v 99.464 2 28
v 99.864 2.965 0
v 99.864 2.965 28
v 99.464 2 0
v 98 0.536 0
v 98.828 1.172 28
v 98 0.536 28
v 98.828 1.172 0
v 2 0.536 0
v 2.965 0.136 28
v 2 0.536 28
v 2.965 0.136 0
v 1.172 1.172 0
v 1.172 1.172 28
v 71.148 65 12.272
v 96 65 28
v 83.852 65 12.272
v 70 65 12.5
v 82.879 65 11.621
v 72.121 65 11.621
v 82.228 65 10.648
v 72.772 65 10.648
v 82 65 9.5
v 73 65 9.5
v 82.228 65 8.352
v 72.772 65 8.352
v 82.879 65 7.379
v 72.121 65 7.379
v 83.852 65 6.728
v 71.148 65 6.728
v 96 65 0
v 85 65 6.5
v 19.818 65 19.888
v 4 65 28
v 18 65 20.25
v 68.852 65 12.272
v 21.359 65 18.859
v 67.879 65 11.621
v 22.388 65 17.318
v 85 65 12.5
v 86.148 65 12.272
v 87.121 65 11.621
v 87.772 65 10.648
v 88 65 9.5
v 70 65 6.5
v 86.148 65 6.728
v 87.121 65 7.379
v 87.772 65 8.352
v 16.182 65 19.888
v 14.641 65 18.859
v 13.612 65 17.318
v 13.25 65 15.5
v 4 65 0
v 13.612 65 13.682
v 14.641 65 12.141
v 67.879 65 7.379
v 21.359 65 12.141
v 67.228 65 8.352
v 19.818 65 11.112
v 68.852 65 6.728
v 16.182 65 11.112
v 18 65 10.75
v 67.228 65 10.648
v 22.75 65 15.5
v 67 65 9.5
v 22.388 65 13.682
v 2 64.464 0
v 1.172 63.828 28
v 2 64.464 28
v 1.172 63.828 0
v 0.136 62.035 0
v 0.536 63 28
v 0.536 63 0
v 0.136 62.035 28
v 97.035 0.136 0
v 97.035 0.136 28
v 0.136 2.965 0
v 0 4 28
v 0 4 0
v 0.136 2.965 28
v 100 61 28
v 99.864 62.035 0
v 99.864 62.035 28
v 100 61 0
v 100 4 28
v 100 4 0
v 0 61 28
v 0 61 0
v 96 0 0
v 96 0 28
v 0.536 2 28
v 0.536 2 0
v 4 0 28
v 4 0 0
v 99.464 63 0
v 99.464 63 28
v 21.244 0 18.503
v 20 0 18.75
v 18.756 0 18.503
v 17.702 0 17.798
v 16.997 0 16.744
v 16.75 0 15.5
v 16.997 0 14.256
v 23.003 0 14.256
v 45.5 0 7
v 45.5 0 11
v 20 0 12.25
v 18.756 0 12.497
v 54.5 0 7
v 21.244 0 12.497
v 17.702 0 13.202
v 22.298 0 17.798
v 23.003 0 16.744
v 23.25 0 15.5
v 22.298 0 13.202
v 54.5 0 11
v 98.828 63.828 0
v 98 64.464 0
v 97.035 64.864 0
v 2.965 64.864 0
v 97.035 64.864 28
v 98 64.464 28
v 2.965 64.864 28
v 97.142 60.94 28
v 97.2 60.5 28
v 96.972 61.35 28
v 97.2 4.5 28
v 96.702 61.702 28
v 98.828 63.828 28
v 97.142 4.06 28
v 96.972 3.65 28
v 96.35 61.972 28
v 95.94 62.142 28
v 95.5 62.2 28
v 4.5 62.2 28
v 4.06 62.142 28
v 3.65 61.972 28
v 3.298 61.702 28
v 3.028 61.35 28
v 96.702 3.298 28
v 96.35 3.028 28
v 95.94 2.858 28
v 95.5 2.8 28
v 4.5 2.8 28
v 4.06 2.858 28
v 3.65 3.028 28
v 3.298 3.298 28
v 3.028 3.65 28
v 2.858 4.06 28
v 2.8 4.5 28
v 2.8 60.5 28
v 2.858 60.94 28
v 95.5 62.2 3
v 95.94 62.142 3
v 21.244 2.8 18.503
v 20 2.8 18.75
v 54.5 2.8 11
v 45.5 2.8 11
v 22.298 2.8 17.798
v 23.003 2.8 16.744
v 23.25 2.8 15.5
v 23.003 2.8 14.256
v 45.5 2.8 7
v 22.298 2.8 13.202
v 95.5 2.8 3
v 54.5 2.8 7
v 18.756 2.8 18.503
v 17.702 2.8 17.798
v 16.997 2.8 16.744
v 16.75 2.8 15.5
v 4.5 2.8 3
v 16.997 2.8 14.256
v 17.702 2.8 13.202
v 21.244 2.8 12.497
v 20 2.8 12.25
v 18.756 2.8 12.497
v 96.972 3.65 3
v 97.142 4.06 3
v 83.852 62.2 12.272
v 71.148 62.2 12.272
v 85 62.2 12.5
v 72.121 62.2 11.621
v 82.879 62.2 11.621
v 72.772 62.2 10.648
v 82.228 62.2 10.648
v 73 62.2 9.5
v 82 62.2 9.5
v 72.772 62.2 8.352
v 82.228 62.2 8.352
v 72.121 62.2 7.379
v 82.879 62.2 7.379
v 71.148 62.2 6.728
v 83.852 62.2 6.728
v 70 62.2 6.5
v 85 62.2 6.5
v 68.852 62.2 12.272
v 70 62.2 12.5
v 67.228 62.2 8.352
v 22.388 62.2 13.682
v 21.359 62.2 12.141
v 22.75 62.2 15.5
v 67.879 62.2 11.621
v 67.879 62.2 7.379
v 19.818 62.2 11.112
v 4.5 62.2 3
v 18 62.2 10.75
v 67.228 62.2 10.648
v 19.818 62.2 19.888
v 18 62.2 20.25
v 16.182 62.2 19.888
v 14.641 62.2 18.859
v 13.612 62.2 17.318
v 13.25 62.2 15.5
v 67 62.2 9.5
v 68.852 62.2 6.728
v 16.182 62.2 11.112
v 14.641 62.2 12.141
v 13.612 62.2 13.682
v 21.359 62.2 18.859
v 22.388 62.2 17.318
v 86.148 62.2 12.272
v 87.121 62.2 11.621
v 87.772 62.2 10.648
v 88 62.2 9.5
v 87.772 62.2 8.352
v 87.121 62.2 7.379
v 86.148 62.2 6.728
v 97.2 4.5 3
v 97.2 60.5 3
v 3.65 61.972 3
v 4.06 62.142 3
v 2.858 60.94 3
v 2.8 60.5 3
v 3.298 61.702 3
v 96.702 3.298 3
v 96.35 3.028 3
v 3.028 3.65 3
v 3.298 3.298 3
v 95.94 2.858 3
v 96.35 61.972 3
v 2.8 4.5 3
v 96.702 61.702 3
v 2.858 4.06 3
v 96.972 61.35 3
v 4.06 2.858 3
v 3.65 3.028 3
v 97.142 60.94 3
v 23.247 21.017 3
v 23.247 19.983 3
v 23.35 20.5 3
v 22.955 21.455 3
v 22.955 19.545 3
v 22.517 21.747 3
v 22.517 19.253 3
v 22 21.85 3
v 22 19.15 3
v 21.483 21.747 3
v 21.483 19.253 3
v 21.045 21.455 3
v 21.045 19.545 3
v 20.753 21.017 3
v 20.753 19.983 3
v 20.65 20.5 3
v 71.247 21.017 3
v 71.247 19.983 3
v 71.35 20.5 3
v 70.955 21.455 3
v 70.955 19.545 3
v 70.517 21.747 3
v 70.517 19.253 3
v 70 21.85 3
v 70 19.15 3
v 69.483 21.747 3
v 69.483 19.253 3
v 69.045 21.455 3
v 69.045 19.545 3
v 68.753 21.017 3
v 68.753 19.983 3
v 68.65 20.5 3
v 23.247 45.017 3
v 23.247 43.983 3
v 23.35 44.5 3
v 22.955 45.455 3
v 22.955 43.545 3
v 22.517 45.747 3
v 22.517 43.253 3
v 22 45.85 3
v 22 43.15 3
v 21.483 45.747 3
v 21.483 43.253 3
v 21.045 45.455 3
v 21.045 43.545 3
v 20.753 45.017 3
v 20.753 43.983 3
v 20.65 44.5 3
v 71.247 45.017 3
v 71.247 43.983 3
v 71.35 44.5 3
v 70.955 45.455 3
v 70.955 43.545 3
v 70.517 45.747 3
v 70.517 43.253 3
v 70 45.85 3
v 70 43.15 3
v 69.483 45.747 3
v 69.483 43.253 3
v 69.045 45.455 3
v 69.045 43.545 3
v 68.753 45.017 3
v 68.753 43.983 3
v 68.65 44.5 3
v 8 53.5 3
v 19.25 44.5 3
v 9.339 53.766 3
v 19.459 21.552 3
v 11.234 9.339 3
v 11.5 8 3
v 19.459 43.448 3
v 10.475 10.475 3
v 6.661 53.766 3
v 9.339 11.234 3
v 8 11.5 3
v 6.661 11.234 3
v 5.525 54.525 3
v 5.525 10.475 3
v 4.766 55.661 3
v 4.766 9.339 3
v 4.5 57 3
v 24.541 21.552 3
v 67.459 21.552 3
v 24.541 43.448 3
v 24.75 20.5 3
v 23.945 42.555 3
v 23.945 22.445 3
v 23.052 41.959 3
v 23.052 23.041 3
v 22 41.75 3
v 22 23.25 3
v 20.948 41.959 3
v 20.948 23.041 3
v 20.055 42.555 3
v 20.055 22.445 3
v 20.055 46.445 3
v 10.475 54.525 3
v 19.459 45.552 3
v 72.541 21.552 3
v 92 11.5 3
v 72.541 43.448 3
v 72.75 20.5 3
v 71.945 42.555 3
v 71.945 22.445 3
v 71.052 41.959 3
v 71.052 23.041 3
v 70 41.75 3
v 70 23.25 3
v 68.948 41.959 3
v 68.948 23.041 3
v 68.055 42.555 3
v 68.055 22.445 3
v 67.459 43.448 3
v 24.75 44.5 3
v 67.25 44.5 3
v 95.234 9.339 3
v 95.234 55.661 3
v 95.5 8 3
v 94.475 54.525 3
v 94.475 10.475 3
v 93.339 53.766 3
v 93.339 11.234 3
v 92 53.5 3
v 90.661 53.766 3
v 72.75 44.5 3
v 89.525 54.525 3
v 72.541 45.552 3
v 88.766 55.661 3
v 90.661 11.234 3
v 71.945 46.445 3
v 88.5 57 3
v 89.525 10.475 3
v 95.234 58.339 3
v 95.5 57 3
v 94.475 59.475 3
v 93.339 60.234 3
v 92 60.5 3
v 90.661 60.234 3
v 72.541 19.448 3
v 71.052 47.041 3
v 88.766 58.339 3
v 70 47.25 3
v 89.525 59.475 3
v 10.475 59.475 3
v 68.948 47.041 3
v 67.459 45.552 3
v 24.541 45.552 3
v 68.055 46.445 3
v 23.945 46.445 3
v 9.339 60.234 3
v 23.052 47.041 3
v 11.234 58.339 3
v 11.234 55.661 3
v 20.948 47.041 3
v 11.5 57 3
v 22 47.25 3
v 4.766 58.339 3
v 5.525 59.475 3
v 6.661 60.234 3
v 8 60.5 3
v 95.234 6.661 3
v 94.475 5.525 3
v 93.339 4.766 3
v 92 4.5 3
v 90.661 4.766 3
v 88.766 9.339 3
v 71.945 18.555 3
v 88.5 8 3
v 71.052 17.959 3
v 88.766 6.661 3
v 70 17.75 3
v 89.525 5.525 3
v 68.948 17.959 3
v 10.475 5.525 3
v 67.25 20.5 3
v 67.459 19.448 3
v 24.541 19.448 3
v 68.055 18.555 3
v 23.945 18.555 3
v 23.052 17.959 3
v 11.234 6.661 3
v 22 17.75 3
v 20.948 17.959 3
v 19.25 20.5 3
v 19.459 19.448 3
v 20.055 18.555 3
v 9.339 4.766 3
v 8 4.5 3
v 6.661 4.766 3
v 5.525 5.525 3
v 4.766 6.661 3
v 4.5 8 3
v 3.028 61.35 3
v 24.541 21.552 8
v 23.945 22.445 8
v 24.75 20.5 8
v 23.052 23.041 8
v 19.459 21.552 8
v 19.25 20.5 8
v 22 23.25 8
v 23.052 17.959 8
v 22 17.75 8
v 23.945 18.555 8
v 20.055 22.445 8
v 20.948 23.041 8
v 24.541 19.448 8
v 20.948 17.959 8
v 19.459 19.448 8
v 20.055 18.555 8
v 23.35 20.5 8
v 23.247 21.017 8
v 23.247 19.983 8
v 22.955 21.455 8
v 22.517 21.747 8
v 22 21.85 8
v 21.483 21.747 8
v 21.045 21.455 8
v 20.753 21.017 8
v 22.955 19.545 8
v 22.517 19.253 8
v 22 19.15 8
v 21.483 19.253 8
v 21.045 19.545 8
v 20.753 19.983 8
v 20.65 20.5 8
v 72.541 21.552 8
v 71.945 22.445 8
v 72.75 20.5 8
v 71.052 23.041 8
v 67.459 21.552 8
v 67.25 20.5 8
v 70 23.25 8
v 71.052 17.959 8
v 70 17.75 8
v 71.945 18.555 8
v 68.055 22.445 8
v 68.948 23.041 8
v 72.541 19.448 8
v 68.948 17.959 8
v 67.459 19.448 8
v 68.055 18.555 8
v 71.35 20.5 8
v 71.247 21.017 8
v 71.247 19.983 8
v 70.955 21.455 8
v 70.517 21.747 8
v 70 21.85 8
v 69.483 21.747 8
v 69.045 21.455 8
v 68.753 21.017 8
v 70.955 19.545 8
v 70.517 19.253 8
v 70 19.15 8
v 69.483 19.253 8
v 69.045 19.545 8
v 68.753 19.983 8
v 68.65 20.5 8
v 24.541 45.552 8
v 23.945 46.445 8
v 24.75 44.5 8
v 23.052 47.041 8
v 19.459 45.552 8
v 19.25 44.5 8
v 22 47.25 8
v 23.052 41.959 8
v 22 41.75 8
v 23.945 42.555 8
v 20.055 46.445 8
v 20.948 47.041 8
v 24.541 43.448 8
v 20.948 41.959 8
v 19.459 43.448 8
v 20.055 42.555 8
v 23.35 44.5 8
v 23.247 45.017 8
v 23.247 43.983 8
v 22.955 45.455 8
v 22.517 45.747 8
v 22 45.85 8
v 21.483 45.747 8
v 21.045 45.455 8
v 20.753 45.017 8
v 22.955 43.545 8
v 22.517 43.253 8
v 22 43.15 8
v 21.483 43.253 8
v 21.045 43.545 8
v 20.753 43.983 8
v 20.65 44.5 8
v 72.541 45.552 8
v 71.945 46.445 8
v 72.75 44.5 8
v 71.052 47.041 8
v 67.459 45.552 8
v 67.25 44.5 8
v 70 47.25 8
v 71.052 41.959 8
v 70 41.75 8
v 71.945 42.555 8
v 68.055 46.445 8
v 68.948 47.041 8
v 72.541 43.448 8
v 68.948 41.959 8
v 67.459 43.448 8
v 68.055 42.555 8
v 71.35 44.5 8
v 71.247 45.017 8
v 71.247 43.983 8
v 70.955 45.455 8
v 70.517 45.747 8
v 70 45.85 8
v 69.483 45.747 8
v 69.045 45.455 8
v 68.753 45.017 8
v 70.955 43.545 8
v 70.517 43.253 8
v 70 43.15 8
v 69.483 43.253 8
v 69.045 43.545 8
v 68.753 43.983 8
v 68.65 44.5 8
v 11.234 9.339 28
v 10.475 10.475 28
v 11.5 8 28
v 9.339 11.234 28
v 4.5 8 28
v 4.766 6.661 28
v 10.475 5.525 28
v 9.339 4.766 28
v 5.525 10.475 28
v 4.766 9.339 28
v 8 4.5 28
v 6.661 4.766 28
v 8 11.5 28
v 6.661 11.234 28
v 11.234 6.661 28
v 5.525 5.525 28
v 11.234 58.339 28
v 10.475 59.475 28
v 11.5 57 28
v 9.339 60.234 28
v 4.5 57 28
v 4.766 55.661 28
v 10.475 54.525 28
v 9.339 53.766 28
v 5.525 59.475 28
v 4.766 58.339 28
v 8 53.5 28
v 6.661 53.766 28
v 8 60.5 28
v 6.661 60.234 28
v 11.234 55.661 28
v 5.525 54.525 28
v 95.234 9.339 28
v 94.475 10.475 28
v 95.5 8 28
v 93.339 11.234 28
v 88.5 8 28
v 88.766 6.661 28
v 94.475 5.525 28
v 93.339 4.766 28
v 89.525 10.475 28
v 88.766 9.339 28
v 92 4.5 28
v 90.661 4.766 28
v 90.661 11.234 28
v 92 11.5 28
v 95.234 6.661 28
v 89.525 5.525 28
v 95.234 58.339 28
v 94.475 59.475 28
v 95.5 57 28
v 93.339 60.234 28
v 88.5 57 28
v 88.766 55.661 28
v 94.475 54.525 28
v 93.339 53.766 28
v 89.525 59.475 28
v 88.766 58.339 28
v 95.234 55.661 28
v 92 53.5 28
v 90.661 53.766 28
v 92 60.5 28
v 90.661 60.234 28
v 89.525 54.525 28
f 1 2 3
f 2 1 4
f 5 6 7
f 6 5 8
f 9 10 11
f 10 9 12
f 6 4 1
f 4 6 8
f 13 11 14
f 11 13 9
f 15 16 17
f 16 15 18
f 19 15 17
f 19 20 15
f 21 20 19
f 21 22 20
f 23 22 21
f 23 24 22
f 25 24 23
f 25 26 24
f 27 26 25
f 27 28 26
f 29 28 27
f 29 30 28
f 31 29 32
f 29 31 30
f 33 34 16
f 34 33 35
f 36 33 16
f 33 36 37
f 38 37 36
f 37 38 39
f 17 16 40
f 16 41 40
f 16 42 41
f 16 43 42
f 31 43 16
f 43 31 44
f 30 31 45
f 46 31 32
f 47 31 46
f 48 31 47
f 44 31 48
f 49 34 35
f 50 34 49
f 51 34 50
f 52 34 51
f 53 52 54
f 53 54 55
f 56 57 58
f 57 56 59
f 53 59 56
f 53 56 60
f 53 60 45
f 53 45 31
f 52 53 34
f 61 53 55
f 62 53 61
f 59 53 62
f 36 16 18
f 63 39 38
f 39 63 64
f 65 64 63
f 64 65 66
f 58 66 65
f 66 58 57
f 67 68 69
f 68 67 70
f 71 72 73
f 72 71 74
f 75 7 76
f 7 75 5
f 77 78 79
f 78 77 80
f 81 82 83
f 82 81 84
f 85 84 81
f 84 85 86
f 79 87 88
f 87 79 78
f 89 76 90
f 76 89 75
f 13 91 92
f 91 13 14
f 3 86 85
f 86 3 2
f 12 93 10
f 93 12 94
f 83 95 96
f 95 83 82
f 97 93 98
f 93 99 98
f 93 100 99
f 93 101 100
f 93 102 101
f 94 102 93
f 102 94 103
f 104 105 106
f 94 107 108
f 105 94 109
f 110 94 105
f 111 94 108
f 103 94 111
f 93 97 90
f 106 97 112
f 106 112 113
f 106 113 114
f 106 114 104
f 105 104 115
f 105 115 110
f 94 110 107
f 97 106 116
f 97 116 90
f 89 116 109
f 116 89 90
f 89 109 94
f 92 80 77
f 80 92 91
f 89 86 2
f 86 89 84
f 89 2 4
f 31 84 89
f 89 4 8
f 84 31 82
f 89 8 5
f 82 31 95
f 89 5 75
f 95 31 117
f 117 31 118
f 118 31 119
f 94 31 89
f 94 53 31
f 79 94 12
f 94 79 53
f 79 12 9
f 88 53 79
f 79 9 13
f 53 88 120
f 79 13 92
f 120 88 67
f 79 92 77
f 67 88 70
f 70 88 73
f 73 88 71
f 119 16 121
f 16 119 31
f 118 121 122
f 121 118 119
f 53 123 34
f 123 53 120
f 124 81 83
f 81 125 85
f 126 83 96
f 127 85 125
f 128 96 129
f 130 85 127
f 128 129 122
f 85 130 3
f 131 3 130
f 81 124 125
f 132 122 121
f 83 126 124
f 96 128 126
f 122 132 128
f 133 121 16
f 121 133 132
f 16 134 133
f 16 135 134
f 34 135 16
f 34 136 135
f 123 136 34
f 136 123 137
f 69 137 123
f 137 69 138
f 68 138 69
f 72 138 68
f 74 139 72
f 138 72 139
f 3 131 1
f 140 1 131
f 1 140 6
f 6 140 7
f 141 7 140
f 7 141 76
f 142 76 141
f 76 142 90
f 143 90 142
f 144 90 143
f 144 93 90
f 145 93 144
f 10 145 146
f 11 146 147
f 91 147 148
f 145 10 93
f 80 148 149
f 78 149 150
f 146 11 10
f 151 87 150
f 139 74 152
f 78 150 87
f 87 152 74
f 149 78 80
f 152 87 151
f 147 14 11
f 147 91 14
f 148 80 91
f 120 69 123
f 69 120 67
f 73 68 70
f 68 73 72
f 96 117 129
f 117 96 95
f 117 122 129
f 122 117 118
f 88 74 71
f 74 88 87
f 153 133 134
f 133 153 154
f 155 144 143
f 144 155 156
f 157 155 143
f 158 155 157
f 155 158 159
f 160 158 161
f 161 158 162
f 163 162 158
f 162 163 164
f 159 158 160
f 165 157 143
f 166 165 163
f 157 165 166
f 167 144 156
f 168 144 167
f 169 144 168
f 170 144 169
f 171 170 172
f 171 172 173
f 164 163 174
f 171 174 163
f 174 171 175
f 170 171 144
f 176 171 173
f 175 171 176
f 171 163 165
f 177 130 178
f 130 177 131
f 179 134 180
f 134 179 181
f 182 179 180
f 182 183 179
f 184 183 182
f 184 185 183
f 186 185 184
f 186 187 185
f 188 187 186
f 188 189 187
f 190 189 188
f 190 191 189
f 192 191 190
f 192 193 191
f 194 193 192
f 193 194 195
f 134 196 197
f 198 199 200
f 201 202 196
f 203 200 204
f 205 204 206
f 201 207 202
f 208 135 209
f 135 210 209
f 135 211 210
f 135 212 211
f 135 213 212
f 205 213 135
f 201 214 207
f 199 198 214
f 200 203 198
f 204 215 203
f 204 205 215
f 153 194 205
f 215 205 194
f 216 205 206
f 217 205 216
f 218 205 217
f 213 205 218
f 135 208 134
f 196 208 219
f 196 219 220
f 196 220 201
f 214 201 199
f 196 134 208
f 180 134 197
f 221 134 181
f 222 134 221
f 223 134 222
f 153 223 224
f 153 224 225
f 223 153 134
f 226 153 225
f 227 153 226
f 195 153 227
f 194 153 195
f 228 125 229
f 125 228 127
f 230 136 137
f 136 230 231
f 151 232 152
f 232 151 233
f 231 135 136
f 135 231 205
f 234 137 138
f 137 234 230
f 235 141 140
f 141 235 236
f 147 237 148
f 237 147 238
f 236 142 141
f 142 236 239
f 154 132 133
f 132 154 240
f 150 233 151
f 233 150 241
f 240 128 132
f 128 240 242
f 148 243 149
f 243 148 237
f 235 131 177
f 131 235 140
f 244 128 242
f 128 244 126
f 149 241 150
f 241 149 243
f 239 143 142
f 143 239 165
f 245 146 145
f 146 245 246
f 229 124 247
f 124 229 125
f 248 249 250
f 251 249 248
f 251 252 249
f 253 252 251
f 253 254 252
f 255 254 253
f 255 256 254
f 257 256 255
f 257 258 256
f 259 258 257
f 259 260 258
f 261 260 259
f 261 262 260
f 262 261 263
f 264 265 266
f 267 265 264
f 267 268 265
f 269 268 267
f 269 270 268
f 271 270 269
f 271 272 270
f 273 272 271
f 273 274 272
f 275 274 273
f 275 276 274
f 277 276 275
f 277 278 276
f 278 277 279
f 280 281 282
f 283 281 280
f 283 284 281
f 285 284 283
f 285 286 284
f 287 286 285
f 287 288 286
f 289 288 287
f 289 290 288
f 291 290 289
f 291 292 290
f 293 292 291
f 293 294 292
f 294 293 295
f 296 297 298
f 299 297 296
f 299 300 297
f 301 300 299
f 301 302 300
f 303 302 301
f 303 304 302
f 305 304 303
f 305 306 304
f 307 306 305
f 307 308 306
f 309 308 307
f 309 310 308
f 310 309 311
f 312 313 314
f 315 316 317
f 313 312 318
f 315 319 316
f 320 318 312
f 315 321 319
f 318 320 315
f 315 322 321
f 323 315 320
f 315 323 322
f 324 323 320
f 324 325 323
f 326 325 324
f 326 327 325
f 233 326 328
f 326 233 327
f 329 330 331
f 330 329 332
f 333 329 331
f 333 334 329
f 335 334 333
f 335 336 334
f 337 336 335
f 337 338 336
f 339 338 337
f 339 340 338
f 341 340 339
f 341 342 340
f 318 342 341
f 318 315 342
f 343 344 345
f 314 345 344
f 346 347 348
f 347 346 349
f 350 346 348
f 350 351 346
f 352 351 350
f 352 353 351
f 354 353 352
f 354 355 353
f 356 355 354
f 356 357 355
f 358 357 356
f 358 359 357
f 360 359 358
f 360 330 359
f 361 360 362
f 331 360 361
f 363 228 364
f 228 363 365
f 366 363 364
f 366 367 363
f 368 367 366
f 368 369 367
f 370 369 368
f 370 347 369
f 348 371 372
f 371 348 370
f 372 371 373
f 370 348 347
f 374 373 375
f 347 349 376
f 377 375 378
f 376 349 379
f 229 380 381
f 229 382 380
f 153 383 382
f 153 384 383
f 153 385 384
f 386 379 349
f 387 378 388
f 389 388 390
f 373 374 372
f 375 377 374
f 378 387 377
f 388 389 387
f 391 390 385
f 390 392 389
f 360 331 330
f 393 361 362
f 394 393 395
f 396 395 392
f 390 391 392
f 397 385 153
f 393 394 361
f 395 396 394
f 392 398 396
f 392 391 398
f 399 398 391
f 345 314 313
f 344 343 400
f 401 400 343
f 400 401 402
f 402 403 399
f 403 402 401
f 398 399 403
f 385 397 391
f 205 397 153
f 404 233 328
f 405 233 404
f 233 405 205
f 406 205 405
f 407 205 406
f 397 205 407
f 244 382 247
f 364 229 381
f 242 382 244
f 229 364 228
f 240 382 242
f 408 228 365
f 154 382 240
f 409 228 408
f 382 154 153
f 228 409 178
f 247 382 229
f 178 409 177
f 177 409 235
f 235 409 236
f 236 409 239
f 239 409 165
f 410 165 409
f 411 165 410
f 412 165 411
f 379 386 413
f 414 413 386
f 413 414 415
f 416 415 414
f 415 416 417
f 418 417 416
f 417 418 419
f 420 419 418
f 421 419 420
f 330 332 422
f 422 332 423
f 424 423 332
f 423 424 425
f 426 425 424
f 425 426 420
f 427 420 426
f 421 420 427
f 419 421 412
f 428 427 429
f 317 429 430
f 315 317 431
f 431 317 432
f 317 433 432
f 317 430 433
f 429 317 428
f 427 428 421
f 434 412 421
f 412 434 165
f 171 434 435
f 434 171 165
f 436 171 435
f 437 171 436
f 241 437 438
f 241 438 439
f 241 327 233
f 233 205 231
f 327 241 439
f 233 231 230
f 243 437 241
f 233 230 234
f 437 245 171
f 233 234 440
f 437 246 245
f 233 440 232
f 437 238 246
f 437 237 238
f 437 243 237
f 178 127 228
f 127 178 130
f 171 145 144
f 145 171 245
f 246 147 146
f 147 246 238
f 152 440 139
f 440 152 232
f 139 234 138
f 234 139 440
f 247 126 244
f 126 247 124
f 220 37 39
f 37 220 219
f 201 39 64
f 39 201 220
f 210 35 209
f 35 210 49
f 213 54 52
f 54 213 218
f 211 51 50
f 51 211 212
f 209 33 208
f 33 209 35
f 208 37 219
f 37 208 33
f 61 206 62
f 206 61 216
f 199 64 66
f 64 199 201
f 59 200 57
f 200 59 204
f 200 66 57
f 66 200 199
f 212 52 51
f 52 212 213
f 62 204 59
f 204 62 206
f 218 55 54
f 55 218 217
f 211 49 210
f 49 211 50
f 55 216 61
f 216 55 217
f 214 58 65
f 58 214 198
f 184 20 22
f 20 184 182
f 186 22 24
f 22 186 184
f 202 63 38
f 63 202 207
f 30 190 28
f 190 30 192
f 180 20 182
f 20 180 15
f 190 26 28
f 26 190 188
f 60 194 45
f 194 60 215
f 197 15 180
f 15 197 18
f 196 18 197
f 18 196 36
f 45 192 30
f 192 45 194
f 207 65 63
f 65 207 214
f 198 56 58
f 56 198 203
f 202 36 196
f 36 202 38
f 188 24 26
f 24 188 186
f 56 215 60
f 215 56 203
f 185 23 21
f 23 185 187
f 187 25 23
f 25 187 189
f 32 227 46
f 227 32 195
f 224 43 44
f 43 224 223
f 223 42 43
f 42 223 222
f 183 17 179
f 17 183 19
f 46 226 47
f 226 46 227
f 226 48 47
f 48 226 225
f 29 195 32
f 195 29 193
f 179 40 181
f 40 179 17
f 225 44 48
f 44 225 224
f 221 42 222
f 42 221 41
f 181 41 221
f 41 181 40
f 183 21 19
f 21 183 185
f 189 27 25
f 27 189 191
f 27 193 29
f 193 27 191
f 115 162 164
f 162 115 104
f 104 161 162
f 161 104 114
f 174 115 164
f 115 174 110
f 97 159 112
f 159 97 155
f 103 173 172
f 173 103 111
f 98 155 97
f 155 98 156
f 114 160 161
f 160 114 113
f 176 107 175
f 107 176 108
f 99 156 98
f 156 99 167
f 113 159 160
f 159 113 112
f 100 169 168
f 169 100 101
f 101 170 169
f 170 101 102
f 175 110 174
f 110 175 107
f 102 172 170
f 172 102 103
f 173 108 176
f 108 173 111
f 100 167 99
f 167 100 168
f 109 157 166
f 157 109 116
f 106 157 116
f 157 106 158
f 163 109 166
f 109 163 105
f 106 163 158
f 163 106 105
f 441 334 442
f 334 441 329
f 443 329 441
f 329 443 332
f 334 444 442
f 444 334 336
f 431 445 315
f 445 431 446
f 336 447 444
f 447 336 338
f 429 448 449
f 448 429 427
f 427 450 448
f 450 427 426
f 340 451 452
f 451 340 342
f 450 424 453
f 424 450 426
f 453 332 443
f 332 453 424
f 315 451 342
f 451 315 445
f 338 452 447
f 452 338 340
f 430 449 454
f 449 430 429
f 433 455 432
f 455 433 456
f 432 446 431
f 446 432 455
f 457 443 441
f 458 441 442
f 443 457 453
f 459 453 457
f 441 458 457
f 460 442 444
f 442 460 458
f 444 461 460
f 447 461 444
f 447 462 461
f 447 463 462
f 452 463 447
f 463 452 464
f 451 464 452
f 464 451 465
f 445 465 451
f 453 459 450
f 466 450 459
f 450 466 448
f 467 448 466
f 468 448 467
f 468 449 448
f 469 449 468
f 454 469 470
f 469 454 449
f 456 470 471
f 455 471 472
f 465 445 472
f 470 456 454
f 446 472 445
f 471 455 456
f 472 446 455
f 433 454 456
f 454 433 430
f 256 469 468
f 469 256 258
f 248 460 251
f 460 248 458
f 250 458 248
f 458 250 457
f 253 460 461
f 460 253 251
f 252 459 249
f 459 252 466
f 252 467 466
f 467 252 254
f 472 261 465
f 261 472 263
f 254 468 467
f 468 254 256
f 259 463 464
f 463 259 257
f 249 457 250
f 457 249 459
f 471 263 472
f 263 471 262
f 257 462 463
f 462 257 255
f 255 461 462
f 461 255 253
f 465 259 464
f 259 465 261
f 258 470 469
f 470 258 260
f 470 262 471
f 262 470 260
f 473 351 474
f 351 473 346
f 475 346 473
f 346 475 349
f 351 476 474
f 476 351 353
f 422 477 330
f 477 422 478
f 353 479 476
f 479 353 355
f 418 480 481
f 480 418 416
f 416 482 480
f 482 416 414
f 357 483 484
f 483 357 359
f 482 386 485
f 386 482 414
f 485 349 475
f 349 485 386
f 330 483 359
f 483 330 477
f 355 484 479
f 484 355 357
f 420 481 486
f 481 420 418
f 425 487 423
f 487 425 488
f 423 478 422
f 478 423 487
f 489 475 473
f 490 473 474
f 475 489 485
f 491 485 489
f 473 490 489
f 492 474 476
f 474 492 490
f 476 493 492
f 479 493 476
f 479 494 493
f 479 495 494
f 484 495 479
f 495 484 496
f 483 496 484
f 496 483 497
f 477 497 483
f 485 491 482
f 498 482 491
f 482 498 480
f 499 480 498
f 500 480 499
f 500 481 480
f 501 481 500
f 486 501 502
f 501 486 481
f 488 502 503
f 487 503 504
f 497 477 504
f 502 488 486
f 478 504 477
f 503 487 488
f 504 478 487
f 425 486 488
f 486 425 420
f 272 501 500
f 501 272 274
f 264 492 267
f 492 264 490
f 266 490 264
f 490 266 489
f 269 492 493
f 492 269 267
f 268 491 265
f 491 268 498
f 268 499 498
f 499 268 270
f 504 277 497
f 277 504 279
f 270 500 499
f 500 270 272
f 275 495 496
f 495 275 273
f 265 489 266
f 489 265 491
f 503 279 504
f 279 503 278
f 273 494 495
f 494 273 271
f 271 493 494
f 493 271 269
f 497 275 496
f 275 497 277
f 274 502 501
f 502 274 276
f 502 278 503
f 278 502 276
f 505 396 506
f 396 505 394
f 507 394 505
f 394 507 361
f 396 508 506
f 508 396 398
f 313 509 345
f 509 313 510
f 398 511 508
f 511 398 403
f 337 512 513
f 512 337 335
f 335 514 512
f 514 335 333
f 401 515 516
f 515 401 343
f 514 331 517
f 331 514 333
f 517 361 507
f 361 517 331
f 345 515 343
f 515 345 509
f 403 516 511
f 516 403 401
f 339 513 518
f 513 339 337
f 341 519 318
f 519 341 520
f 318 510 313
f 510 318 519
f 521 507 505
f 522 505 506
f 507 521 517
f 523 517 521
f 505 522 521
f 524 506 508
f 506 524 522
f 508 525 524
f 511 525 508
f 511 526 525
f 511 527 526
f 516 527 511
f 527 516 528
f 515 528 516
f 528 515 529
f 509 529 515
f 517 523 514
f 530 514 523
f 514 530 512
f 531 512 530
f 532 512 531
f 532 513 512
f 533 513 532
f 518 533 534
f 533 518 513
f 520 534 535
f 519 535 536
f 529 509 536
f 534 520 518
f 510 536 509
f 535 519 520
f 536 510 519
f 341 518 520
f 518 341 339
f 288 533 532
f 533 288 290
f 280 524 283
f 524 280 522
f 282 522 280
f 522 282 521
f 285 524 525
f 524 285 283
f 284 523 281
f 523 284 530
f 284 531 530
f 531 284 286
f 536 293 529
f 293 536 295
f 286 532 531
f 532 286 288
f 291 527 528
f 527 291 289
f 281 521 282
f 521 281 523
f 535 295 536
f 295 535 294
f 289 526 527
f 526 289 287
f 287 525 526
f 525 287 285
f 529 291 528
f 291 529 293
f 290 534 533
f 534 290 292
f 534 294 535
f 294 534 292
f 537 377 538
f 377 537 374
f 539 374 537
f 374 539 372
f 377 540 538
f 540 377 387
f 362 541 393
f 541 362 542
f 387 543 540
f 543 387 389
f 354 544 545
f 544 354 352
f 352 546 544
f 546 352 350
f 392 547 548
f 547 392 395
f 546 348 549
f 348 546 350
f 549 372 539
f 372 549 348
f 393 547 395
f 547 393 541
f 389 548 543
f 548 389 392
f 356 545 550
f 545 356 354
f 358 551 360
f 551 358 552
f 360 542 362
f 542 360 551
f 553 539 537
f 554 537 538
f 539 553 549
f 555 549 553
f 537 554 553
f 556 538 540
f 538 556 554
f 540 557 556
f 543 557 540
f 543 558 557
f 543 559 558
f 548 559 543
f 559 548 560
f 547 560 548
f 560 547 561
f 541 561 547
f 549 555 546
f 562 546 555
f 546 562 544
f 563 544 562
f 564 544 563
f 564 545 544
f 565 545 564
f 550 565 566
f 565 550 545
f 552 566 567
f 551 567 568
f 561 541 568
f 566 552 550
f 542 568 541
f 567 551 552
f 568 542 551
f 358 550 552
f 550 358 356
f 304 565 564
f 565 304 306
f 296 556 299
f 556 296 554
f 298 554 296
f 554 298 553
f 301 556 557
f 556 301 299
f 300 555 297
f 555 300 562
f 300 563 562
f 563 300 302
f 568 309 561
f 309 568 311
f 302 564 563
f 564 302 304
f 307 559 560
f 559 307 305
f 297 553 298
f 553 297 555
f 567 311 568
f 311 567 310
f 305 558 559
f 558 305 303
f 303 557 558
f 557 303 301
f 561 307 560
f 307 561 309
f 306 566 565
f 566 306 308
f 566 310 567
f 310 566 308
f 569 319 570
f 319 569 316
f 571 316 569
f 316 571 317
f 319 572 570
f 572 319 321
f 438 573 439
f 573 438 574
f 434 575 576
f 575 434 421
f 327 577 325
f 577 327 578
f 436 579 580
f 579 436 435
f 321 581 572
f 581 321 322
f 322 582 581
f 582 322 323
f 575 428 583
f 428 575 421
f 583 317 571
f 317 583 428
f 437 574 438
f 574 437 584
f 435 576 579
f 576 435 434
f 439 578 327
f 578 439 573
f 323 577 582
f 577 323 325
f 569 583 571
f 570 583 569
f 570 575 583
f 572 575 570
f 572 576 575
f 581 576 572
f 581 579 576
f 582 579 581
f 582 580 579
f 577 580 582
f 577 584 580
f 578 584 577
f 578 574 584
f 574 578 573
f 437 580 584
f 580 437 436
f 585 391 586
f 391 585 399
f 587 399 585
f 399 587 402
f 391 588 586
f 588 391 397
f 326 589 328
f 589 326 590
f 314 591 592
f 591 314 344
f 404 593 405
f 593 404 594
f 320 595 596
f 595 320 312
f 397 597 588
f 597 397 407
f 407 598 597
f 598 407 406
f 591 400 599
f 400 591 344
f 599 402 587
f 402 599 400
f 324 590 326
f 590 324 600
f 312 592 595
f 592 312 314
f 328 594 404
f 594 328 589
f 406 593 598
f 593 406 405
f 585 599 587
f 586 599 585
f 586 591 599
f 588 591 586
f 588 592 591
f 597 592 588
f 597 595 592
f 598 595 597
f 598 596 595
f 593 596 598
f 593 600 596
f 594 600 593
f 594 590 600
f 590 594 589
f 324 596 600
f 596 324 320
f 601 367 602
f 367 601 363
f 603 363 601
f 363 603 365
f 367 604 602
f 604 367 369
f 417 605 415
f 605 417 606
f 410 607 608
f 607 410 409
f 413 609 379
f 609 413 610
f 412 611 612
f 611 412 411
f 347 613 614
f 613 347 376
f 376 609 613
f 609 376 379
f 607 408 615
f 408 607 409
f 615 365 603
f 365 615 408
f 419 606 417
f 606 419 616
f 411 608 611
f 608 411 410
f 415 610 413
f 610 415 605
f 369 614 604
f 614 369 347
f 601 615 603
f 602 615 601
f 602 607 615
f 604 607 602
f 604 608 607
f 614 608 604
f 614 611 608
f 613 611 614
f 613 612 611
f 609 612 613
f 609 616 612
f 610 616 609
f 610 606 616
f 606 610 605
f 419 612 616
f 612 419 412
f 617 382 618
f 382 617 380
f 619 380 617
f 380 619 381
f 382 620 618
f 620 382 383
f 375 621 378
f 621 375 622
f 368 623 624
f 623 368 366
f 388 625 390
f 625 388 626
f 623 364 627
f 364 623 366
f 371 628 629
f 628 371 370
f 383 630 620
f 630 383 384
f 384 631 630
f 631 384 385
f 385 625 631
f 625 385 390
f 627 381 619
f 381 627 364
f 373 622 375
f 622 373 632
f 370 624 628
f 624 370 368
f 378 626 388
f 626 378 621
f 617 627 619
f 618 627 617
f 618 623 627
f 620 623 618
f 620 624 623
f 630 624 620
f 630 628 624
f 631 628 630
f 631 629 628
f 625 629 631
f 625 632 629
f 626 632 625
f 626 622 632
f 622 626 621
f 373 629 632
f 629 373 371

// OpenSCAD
/**
 * freq_counter_box.scad — TM-CAL-ENC-004 Rev A
 * Standalone Frequency Counter Enclosure
 *
 * Standalone counter for field use when full cal station isn't needed.
 * Accepts GPSDO 1PPS reference via SMA (rear), or runs free-running
 * (lower accuracy) if GPS not connected.
 *
 * Contents:
 *   - ESP32-WROOM-32 devboard
 *   - 74ACT14 Schmitt trigger + 74HC390 prescaler PCB
 *   - SSD1306 OLED 128×64 (front panel)
 *
 * Front panel: BNC FREQ IN, OLED display, range switch, gate switch
 * Rear panel:  SMA 1PPS IN (GPS gate), USB power, SMA HOLD (future)
 *
 * Envelope: 100×65×38 mm
 */

// ── Parameters ──────────────────────────────────────────────────────────────
box_w  = 100.0;
box_d  = 65.0;
box_h  = 38.0;
wall   = 2.8;
floor_h = 3.0;
lid_h  = 10.0;
body_h = box_h - lid_h;
r      = 4.0;
$fn    = 32;

// Component cutouts
bnc_d      = 9.5;
sma_d      = 6.5;
oled_w     = 28.0;   // SSD1306 0.96" OLED active area
oled_h     = 14.0;
usb_w      = 9.0;
usb_h      = 4.0;
sw_d       = 6.0;    // toggle switch shaft hole
screw_d    = 3.3;

// OLED position: centered horizontally, upper third of front panel
oled_x     = (box_w - oled_w) / 2;
oled_z     = floor_h + 10;

module rounded_box(w, d, h, r_) {
    hull()
        for (x=[r_, w-r_]) for (y=[r_, d-r_])
            translate([x, y, 0]) cylinder(h=h, r=r_, $fn=24);
}

module standoff(x, y) {
    translate([x, y, floor_h])
        difference() {
            cylinder(h=5, d=5.5, $fn=16);
            translate([0,0,-0.5]) cylinder(h=6, d=2.7, $fn=16);
        }
}

module body() {
    difference() {
        rounded_box(box_w, box_d, body_h, r);

        // Inner cavity
        translate([wall, wall, floor_h])
            rounded_box(box_w-2*wall, box_d-2*wall, body_h, r-wall+0.5);

        // ── FRONT PANEL (y=box_d) ──────────────────────────────────────
        // BNC FREQ IN (left side of front panel)
        translate([18, box_d+0.5, floor_h + (body_h-floor_h)/2])
        rotate([90,0,0]) cylinder(h=wall+1, d=bnc_d, $fn=16);

        // OLED window (center/right)
        translate([oled_x, box_d+0.5, oled_z])
            cube([oled_w, wall+1, oled_h]);

        // Range toggle switch (÷1/÷10)
        translate([70, box_d+0.5, floor_h + (body_h-floor_h)/2 - 6])
        rotate([90,0,0]) cylinder(h=wall+1, d=sw_d, $fn=16);

        // Gate toggle switch (1s/10s)
        translate([85, box_d+0.5, floor_h + (body_h-floor_h)/2 - 6])
        rotate([90,0,0]) cylinder(h=wall+1, d=sw_d, $fn=16);

        // ── REAR PANEL (y=0) ──────────────────────────────────────────
        // SMA: 1PPS IN from GPSDO
        translate([20, -0.5, floor_h + (body_h-floor_h)/2])
        rotate([-90,0,0]) cylinder(h=wall+1, d=sma_d, $fn=16);

        // USB Micro-B power
        translate([50-usb_w/2, -0.5, floor_h+4])
            cube([usb_w, wall+1, usb_h]);

        // ── Lid screw holes ───────────────────────────────────────────
        for (x=[8, box_w-8]) for (y=[8, box_d-8])
            translate([x, y, body_h-5])
                cylinder(h=6, d=screw_d, $fn=16);
    }

    // PCB standoffs for ESP32 devboard
    ex = (box_w - 52) / 2 - 4;
    ey = (box_d - 28) / 2;
    standoff(ex + 2,       ey + 2);
    standoff(ex + 52-2,    ey + 2);
    standoff(ex + 2,       ey + 28-2);
    standoff(ex + 52-2,    ey + 28-2);

    // Corner bosses
    for (x=[8, box_w-8]) for (y=[8, box_d-8])
        translate([x, y, 0]) cylinder(h=body_h, d=7, $fn=16);
}

module lid() {
    fl_d    = 3.5;
    plate_h = lid_h - fl_d;
    difference() {
        union() {
            rounded_box(box_w, box_d, plate_h, r);
            translate([wall+1, wall+1, plate_h])
                rounded_box(box_w-2*(wall+1), box_d-2*(wall+1), fl_d, r-wall);
        }
        for (x=[8, box_w-8]) for (y=[8, box_d-8])
            translate([x, y, -0.5])
                cylinder(h=lid_h+1, d=screw_d, $fn=16);
    }
    // Label on lid top face
    translate([(box_w-60)/2, (box_d-10)/2, plate_h - 0.6])
        linear_extrude(0.8)
            text("GPS FREQ COUNTER", size=4.5, font="Liberation Sans:style=Bold");
}

print_part = "body";   // "body" | "lid"

if (print_part == "body")
    color("darkcyan", 0.9) body();
else
    color("cadetblue", 0.9) lid();

// ── Assembly Notes ──────────────────────────────────────────────────────────
// 1. Print in PETG. Connect BNC panel connector to 74ACT14 input board
//    via short coax stub (keep trace <20mm to minimize pickup).
// 2. SSD1306 OLED: glue into front panel opening from inside with silicone.
//    I2C wires: SDA → GPIO21, SCL → GPIO22.
// 3. Range switch (SPDT): connects 74HC390 ÷10 output to GPIO33 when in
//    DIV10 position; wires direct input GPIO32 otherwise.
// 4. Gate switch (SPDT): connects to GPIO39 (ADC-only, used as digital in);
//    LOW = 1s gate, HIGH = 10s gate.
// 5. 1PPS SMA: wire to GPIO34 via 4.7kΩ pull-up to 3V3.
// 6. Counter operates autonomously; provides BT packet if connected to CYD.
